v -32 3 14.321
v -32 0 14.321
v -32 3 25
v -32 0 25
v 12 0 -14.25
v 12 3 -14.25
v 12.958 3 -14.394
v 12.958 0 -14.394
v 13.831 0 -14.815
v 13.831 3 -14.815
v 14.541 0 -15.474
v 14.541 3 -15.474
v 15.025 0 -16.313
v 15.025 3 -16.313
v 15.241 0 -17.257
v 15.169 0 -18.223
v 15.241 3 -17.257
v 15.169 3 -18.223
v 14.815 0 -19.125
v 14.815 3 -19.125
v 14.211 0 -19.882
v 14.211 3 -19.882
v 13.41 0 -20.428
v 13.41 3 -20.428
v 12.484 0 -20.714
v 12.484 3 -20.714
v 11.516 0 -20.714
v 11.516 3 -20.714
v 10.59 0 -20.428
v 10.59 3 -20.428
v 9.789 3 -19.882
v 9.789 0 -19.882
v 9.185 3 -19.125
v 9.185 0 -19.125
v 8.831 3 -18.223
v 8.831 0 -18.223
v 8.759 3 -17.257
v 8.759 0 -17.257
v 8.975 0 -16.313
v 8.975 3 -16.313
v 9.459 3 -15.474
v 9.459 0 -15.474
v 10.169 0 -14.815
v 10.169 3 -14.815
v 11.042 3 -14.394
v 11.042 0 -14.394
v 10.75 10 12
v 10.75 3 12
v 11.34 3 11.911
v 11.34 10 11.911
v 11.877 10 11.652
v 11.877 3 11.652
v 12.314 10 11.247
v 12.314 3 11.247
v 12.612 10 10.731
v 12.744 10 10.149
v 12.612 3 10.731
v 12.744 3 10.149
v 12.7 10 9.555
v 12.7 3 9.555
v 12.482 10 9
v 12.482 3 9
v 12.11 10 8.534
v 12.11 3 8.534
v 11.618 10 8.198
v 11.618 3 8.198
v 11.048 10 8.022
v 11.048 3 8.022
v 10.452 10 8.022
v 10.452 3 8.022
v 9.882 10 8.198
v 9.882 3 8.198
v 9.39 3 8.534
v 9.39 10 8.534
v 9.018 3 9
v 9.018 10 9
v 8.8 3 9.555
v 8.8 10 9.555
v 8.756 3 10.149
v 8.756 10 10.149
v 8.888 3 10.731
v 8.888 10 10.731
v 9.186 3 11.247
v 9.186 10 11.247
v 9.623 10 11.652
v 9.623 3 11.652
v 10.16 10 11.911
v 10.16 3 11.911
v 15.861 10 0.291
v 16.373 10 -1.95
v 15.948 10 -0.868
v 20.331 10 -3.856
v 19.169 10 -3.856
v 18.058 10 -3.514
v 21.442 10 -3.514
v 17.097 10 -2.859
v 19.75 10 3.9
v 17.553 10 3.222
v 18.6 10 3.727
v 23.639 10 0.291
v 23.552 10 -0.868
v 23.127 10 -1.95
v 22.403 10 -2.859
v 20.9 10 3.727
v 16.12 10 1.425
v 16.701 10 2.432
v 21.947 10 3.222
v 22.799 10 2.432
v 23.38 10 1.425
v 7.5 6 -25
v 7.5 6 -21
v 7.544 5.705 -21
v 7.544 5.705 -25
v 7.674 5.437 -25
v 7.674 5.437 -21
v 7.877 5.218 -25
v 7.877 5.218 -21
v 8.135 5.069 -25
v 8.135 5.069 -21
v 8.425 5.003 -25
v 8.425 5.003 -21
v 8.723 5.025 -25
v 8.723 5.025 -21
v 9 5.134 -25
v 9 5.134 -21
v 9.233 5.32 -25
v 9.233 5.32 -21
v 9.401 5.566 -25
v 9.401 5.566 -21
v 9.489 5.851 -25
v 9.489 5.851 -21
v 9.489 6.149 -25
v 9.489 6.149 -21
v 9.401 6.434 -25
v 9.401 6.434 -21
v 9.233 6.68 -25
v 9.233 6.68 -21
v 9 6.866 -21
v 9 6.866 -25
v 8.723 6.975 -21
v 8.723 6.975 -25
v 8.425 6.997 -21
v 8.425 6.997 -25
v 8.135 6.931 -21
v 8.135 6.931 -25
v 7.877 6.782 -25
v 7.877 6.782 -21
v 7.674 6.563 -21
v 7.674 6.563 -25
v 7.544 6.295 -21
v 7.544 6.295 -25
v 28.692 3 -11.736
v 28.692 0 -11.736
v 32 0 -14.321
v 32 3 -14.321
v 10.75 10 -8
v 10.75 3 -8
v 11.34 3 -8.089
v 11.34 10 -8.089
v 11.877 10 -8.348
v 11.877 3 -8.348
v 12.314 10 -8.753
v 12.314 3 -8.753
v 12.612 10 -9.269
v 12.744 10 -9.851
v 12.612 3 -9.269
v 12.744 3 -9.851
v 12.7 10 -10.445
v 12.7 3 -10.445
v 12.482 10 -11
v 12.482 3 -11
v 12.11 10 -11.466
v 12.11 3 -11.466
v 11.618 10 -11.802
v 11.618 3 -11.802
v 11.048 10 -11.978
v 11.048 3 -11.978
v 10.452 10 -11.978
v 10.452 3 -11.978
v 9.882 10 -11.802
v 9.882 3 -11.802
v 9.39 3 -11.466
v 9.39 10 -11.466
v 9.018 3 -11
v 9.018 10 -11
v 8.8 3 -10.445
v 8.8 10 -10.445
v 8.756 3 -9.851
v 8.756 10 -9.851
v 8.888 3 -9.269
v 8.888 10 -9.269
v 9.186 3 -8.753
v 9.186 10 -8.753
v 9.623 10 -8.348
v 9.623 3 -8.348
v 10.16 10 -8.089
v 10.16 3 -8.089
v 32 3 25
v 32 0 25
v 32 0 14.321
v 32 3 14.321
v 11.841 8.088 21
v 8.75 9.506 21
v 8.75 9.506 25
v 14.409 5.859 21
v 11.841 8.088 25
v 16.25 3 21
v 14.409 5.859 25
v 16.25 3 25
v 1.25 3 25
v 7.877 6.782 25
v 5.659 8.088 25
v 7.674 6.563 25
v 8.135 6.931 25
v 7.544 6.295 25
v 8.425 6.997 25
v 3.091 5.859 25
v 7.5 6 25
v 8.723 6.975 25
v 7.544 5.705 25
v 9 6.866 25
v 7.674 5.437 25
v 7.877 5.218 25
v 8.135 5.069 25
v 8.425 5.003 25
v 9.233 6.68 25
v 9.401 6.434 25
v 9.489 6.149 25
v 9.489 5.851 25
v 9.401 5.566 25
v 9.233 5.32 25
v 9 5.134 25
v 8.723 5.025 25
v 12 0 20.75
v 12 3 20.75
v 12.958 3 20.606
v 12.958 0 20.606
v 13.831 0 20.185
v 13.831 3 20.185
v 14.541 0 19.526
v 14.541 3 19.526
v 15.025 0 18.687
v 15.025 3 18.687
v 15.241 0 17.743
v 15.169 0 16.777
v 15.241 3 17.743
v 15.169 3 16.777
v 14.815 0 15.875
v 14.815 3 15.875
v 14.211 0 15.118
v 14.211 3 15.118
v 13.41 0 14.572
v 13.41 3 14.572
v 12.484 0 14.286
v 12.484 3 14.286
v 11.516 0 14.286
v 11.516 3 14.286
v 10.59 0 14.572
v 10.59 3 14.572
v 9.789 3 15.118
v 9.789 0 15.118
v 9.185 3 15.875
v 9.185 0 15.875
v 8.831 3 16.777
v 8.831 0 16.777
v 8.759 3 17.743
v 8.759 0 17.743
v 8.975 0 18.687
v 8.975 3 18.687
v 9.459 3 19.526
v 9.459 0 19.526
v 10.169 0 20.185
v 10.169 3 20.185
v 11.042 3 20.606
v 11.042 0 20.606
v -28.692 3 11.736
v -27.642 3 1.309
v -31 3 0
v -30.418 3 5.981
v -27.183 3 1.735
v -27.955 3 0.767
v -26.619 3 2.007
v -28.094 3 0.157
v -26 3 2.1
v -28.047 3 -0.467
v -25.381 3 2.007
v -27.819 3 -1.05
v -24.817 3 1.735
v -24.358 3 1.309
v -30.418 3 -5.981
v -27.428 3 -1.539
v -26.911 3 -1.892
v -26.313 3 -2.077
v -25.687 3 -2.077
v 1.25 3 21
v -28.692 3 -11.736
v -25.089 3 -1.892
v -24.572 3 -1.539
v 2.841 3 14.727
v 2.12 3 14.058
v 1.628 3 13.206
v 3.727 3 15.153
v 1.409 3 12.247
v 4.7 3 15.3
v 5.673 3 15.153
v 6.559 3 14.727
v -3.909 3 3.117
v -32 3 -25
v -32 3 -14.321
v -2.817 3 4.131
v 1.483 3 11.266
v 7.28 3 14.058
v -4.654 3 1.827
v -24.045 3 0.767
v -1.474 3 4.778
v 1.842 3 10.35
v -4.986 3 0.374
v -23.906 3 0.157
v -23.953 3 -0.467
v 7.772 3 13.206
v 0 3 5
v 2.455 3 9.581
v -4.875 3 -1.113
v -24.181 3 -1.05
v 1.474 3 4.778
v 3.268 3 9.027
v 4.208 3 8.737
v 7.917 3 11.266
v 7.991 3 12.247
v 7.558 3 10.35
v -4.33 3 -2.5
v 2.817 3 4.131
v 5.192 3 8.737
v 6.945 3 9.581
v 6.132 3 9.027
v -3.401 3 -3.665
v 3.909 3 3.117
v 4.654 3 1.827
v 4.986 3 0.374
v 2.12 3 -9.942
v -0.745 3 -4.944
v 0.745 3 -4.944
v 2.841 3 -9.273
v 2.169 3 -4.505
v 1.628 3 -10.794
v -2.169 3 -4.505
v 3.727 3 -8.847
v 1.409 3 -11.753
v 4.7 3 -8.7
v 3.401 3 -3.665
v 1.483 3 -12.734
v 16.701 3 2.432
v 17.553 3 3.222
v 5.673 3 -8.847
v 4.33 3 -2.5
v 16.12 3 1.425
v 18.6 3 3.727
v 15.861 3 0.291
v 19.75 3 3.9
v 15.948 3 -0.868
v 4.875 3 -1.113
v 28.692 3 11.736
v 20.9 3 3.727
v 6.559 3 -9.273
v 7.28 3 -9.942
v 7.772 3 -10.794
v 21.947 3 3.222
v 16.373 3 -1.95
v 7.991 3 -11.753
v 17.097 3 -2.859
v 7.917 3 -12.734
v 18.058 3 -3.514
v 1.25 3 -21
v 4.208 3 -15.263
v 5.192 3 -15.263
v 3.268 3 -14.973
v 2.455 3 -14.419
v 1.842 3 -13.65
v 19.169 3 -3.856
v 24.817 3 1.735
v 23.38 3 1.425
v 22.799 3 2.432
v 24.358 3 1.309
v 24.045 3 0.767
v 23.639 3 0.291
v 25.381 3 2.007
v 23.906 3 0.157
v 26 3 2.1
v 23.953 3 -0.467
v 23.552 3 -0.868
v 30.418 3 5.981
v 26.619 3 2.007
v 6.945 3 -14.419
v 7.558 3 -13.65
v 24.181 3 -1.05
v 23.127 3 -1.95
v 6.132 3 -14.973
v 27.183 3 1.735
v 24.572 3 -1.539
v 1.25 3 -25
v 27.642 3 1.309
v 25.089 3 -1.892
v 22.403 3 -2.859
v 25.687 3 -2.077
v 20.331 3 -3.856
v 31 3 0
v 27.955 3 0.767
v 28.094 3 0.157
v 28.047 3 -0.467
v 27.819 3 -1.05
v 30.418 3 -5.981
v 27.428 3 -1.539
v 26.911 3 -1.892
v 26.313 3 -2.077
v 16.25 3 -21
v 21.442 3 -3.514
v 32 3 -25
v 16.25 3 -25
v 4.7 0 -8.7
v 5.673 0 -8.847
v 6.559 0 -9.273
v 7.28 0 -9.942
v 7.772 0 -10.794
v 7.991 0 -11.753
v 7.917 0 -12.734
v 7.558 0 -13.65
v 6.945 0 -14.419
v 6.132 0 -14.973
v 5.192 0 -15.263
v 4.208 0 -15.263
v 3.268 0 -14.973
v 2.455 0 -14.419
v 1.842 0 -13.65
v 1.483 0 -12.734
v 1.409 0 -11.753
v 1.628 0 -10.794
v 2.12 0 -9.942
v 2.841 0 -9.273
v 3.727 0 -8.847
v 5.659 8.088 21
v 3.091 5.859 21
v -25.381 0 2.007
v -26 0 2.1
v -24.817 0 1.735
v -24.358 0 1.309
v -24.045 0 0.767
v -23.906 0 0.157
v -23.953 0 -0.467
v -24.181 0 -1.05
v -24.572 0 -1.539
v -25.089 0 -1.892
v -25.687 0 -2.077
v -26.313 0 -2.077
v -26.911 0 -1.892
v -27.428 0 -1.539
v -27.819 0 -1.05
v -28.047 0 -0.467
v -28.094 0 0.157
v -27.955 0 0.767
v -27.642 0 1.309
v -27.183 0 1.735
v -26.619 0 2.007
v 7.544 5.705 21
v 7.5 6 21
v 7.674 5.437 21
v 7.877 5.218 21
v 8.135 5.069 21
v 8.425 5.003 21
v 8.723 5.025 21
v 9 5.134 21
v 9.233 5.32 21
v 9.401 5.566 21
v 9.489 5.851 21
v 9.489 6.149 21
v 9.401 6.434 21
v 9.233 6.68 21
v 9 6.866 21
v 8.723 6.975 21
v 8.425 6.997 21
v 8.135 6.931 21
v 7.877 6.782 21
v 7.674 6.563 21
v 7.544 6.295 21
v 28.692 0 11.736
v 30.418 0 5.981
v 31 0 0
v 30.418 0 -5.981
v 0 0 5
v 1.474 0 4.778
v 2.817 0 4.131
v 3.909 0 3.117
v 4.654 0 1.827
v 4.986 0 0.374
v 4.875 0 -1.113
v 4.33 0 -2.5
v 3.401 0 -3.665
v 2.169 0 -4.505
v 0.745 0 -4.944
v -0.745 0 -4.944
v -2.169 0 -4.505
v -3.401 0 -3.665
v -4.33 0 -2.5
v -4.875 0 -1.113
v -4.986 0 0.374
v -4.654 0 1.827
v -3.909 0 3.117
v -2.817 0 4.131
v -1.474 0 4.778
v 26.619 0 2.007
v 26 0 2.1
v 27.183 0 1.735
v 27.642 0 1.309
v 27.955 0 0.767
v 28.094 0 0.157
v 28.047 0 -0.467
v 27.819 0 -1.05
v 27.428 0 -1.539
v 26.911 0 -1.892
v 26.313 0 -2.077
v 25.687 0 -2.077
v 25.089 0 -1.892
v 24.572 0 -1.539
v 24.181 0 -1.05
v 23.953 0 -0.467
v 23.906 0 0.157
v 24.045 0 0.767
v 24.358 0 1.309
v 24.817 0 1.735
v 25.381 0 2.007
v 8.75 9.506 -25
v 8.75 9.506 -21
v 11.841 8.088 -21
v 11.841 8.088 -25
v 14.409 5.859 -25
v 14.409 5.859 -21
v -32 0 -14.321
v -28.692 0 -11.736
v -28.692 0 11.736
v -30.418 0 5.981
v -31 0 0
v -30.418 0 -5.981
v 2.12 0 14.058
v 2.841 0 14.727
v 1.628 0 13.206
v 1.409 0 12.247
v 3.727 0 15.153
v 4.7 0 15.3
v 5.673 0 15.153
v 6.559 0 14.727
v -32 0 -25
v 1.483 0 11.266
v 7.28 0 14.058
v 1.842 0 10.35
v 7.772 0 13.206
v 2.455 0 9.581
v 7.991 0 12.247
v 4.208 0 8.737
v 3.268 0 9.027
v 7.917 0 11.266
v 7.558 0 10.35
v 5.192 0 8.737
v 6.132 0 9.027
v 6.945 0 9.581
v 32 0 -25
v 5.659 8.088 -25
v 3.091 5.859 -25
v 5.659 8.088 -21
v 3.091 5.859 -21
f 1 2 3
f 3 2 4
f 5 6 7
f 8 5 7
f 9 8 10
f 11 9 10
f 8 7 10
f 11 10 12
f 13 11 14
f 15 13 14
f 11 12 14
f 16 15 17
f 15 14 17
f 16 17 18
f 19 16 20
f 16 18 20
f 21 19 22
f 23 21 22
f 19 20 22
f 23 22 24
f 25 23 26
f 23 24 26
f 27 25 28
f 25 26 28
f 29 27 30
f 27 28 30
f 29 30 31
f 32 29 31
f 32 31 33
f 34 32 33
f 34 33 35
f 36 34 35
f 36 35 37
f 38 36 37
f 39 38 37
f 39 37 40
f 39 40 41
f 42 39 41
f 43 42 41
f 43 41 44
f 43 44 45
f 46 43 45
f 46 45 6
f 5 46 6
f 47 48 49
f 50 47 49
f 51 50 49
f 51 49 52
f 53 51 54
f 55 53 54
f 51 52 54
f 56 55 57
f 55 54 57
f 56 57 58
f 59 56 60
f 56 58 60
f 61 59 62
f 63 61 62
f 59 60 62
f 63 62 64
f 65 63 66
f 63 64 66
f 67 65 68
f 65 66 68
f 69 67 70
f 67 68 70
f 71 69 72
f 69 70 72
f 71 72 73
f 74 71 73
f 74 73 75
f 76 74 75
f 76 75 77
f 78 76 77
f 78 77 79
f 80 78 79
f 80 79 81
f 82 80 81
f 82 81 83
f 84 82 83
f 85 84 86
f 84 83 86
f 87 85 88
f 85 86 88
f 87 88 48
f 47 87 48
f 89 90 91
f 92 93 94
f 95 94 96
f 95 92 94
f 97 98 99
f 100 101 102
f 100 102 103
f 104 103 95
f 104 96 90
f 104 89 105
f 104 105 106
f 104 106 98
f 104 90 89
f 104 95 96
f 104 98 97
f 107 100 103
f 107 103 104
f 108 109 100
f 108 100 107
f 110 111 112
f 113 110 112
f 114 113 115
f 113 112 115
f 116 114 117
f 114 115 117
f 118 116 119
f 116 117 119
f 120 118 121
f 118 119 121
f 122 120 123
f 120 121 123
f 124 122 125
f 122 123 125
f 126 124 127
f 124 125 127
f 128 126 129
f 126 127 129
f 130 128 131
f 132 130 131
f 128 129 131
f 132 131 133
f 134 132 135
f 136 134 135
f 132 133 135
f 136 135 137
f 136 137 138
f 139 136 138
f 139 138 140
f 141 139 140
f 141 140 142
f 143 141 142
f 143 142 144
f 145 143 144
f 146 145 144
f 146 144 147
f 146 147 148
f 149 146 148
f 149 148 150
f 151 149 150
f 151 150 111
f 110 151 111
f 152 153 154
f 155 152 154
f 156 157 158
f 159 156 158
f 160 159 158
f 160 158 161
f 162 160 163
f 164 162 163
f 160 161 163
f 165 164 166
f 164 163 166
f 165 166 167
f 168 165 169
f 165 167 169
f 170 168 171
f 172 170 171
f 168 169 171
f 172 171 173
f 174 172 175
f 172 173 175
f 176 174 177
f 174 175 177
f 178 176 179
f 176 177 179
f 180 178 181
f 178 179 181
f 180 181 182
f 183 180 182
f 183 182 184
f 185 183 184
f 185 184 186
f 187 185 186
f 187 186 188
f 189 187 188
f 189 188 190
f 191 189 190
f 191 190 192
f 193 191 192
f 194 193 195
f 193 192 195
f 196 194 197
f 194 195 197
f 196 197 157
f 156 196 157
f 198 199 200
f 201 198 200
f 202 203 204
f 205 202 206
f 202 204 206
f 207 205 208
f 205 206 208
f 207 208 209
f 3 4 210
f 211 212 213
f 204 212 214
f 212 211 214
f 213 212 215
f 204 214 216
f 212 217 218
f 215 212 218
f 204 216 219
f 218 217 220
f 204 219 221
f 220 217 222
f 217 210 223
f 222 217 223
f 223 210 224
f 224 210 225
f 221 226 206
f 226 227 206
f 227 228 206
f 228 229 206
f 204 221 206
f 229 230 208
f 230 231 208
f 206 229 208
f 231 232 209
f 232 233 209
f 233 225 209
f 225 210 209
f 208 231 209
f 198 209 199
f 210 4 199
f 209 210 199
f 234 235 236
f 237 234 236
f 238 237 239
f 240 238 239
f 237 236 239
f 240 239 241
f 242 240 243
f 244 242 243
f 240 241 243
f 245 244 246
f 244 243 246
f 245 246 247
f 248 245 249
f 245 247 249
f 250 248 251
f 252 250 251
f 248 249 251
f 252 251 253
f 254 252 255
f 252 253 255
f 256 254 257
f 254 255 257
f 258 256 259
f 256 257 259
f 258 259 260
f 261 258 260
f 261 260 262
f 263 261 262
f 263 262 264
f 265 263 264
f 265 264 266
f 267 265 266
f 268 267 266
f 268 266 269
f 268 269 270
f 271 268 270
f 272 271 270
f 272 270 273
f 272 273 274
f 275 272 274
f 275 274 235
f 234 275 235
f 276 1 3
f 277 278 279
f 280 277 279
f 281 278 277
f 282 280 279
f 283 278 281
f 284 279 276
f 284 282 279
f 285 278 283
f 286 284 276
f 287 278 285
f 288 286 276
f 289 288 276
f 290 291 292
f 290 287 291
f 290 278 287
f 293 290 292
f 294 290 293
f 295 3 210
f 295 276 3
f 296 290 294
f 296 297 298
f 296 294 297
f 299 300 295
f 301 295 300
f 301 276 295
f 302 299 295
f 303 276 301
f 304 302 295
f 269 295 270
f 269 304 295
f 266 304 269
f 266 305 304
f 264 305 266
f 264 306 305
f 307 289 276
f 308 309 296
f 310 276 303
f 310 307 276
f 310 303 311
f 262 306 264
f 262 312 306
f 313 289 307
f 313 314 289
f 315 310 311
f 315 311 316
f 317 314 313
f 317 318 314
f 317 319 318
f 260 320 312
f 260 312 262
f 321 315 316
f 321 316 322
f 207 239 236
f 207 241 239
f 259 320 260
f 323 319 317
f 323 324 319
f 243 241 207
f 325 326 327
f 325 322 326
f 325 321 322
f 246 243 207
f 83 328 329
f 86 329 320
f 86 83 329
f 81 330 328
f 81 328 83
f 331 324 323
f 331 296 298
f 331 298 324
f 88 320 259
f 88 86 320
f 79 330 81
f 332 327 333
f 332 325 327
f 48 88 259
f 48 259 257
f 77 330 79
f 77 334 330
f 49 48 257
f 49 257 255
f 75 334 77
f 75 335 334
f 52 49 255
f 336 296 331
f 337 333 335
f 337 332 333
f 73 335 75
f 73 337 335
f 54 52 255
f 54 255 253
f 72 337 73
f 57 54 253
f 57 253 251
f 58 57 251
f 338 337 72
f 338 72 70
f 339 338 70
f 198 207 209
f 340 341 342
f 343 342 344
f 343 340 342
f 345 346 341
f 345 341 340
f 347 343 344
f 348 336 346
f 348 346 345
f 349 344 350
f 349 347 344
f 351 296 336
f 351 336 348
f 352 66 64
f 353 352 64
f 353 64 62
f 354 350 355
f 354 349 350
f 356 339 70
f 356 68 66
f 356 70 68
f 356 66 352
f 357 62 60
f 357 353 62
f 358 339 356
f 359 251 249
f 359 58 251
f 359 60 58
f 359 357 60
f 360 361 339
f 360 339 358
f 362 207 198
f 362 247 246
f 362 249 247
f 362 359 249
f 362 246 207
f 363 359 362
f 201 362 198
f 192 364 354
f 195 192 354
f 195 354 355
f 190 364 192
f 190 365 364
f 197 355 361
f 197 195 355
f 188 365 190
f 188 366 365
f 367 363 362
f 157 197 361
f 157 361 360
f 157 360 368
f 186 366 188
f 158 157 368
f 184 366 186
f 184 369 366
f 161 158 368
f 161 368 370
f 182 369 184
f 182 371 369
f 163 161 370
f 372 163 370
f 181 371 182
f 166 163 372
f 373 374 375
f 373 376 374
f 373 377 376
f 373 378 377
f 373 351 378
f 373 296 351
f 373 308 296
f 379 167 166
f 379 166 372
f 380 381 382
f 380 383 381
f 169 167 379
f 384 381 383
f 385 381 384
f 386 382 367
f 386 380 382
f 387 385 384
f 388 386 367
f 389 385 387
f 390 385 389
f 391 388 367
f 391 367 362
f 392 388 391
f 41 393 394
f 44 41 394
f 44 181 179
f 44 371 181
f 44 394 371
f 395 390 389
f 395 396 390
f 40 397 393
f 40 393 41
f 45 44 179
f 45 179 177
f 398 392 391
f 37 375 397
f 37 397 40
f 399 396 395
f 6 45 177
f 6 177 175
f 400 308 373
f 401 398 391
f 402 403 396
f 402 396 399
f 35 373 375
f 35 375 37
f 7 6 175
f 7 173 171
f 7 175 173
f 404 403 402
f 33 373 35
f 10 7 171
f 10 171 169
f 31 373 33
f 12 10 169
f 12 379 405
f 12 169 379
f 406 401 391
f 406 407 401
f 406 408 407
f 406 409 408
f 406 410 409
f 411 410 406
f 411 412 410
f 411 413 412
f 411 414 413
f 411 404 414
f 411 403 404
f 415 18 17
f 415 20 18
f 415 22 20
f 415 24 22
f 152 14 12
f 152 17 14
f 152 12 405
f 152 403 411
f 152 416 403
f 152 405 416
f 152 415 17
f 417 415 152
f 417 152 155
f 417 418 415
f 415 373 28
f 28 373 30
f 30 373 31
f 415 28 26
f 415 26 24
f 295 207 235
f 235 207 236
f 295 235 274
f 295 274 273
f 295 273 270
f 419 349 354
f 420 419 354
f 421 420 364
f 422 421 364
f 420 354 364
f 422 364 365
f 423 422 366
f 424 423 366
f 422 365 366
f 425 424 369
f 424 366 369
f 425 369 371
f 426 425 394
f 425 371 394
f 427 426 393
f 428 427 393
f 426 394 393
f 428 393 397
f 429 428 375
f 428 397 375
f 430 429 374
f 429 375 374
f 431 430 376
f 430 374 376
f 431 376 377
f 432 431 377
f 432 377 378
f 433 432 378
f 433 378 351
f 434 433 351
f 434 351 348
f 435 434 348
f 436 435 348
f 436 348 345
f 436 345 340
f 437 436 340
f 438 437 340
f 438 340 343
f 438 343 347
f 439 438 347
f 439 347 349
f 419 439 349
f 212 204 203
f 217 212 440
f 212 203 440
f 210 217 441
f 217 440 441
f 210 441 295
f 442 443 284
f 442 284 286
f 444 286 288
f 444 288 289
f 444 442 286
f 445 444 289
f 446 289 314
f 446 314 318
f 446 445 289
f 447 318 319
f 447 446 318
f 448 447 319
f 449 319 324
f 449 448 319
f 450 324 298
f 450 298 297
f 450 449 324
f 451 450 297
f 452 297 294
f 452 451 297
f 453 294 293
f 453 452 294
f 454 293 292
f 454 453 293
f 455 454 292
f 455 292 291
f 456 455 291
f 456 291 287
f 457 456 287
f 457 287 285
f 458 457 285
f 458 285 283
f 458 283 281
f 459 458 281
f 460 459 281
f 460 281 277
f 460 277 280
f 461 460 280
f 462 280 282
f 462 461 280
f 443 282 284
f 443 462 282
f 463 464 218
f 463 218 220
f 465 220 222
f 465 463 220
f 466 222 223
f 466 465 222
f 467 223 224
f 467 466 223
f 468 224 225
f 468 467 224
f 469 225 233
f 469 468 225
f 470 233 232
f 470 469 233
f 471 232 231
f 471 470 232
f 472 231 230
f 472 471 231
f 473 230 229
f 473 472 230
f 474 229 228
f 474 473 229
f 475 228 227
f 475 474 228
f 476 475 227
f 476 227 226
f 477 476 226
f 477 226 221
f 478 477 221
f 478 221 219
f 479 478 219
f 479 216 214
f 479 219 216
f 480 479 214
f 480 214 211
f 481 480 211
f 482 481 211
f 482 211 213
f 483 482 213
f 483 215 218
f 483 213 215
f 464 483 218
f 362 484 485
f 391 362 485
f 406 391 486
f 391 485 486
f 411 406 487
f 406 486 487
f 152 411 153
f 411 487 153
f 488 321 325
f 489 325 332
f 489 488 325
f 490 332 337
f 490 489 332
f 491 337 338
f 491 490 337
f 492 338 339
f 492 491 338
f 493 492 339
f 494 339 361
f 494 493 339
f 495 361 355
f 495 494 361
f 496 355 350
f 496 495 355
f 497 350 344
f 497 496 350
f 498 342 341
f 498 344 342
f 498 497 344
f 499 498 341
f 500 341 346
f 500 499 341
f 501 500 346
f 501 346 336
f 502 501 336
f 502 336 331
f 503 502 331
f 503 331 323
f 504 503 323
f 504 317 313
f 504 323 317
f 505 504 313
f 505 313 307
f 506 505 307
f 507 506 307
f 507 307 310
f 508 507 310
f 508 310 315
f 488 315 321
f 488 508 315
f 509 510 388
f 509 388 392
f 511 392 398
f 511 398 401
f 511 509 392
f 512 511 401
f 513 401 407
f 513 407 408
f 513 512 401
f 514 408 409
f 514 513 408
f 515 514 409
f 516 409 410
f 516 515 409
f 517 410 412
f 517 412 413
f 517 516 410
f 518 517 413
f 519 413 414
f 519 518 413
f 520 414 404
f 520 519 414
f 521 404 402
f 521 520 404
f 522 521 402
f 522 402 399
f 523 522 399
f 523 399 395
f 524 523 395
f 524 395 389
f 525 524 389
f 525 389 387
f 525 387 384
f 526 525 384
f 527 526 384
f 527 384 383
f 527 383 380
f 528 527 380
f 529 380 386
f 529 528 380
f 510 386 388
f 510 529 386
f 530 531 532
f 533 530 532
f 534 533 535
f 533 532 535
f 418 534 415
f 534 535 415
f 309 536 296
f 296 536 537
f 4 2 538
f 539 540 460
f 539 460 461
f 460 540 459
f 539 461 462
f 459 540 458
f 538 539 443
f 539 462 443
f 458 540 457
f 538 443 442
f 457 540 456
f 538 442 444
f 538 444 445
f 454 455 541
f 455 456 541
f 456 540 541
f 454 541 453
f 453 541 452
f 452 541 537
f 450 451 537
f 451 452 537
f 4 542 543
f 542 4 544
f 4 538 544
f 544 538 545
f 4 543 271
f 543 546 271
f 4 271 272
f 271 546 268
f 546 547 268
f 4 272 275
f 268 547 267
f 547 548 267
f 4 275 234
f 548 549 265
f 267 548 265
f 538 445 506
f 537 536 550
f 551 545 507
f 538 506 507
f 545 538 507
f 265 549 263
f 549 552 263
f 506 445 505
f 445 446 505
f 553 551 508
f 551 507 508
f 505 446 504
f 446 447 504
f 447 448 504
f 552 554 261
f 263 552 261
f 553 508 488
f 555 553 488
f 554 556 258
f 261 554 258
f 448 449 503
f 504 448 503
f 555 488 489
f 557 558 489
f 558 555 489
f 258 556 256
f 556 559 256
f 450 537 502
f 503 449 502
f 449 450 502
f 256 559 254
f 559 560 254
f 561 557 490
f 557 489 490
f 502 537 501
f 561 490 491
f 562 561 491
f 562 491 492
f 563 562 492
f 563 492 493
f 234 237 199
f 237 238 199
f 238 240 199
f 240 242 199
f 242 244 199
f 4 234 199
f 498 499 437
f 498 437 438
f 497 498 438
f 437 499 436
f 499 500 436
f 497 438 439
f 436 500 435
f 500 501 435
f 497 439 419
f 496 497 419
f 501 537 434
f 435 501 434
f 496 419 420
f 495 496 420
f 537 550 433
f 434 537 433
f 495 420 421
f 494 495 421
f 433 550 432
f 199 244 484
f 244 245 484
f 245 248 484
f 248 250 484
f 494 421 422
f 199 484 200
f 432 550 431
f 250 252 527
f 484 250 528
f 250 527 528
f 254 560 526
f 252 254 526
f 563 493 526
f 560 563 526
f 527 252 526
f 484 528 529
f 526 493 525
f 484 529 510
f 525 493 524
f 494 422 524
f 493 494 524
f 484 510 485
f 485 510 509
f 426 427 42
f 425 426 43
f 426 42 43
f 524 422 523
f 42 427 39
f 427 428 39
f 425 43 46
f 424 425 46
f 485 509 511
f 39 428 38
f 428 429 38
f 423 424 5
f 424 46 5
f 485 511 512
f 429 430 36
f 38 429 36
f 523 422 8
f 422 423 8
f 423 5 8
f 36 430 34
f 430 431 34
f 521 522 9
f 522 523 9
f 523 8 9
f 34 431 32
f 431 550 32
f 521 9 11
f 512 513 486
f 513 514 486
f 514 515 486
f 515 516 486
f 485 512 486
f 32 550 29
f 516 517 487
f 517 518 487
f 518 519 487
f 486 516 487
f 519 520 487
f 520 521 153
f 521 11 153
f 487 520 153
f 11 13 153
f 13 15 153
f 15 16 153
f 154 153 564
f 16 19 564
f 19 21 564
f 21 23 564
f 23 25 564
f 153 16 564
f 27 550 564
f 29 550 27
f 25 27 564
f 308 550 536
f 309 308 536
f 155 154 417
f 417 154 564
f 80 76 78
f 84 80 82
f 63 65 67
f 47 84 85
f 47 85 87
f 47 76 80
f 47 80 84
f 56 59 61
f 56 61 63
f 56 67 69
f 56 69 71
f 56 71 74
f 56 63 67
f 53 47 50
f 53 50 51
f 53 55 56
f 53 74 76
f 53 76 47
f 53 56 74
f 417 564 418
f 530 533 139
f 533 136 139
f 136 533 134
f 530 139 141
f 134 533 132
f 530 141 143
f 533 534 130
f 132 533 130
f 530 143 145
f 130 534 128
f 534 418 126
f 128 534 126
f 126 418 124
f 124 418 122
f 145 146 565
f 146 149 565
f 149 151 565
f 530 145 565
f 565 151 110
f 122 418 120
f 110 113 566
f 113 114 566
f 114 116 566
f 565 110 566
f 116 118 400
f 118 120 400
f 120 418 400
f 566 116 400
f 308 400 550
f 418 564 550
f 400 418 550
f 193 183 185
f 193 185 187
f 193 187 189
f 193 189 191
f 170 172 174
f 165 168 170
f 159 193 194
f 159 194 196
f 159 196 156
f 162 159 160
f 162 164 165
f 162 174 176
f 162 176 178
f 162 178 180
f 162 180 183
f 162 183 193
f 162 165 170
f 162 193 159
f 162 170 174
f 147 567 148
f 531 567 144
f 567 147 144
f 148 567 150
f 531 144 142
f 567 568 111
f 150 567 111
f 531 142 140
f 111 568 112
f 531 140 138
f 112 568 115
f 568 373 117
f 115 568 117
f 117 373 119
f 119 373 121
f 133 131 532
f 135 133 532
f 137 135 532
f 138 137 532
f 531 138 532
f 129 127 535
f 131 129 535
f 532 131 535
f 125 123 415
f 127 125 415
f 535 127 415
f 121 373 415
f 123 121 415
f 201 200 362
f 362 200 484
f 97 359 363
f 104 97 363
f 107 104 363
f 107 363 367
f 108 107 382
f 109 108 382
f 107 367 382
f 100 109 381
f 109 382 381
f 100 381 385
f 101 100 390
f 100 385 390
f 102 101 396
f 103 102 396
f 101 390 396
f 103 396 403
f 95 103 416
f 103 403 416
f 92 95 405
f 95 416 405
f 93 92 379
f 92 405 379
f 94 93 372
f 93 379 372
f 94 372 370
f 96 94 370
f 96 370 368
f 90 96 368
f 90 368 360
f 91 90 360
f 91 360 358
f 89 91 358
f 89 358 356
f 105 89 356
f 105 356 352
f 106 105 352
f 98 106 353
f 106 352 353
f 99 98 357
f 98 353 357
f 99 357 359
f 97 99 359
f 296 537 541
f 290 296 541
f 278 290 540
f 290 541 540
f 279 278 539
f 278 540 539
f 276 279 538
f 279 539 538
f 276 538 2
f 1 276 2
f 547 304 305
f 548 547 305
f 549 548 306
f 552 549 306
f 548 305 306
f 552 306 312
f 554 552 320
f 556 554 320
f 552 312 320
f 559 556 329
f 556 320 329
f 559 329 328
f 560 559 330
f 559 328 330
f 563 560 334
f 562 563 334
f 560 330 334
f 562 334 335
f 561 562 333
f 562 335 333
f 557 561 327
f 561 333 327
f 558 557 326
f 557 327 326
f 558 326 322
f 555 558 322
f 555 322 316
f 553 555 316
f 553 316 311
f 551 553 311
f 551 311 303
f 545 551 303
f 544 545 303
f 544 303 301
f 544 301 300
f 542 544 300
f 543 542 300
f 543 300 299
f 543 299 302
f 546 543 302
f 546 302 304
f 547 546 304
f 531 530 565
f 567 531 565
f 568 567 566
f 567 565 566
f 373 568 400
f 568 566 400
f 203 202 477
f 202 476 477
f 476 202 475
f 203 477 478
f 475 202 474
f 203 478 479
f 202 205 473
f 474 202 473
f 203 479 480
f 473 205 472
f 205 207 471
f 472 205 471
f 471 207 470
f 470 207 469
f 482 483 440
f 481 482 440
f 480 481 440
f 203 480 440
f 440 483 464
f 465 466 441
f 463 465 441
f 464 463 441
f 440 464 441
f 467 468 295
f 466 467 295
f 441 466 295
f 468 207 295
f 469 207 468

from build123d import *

# Parameters (mm, degrees)
SKETCH1_R               = 2.1
BOSS_EXTRUDE2_DEPTH     = 3
SKETCH1_14_R            = 5
CUT_EXTRUDE2_DEPTH      = 10
SKETCH2_R               = 2
SKETCH2_W               = 15
SKETCH2_H               = 4
SKETCH2_R_2             = 3.9
BOSS_EXTRUDE3_DEPTH     = 7
SKETCH2_4_R             = 3.25
SKETCH2_4_R_2           = 3.3
CUT_EXTRUDE3_DEPTH      = 7
CUT_EXTRUDE4_DEPTH      = 61.199667773
CUT_EXTRUDE4_DEPTH_BACK = 7
SKETCH3_R               = 1
FILLET1_R               = 12
CUT_EXTRUDE5_START      = -41
SKETCH3_3_R             = 1
CUT_EXTRUDE5_DEPTH      = 9


with BuildPart() as part:
    # Sketch1 → Boss-Extrude2 (new body)
    with BuildSketch(Plane(origin=(0, 0, 0), x_dir=(1, 0, 0), z_dir=(0, 1, 0))):
        with BuildLine():
            Line((32, -25), (32, -14.320549047))
            Line((32, -14.320549047), (28.692414075, -11.736497543))
            ThreePointArc((28.692414075, -11.736497543), (31, 0), (28.692414075, 11.736497543))
            Line((28.692414075, 11.736497543), (32, 14.320549047))
            Line((32, 14.320549047), (32, 25))
            Line((32, 25), (-32, 25))
            Line((-32, 25), (-32, 14.320549047))
            Line((-32, 14.320549047), (-28.692414075, 11.736497543))
            ThreePointArc((-28.692414075, 11.736497543), (-31, 0), (-28.692414075, -11.736497543))
            Line((-28.692414075, -11.736497543), (-32, -14.320549047))
            Line((-32, -14.320549047), (-32, -25))
            Line((-32, -25), (32, -25))
        make_face()
        with Locations(Location((26, 0, 0), (0, 0, 270))):
            Circle(SKETCH1_R, mode=Mode.SUBTRACT)
        with Locations(Location((-26, 0, 0), (0, 0, 270))):
            Circle(SKETCH1_R, mode=Mode.SUBTRACT)
    extrude(amount=BOSS_EXTRUDE2_DEPTH)

    # Sketch1<14> → Cut-Extrude2 (cut)
    with BuildSketch(Plane(origin=(0, 0, 0), x_dir=(1, 0, 0), z_dir=(0, 1, 0))):
        with Locations(Location((0, 0, 0), (0, 0, 270))):
            Circle(SKETCH1_14_R)
    extrude(amount=CUT_EXTRUDE2_DEPTH, mode=Mode.SUBTRACT)

    # Sketch2 → Boss-Extrude3 (add)
    with BuildSketch(Plane(origin=(0, 3, 0), x_dir=(1, 0, 0), z_dir=(0, 1, 0))):
        with Locations(Location((10.75, -10, 0), (0, 0, 269.999999999))):
            Circle(SKETCH2_R)
        Polygon((8.75, -21), (1.25, -21), (1.25, -25), (16.25, -25), (16.25, -21), align=None)
        with Locations((8.75, 23)):
            Rectangle(SKETCH2_W, SKETCH2_H)
        with Locations(Location((19.75, 0, 0), (0, 0, 270))):
            Circle(SKETCH2_R_2)
        with Locations(Location((10.75, 10, 0), (0, 0, 270))):
            Circle(SKETCH2_R)
    extrude(amount=BOSS_EXTRUDE3_DEPTH)

    # Sketch2<4> → Cut-Extrude3 (cut)
    with BuildSketch(Plane(origin=(0, 3, 0), x_dir=(1, 0, 0), z_dir=(0, 1, 0))):
        with Locations(Location((12, 17.5, 0), (0, 0, 270))):
            Circle(SKETCH2_4_R)
        with Locations(Location((4.7, 12, 0), (0, 0, 270))):
            Circle(SKETCH2_4_R_2)
        with Locations(Location((12, -17.5, 0), (0, 0, 270))):
            Circle(SKETCH2_4_R)
        with Locations(Location((4.7, -12, 0), (0, 0, 270))):
            Circle(SKETCH2_4_R_2)
    extrude(amount=-CUT_EXTRUDE3_DEPTH, mode=Mode.SUBTRACT)

    # Sketch3 → Cut-Extrude4 (cut, two sides: drawn at the far end of the back side and taken through both)
    with BuildSketch(Plane.XY.offset(25).offset(-CUT_EXTRUDE4_DEPTH_BACK)):
        with Locations(Location((8.5, 6, 0), (0, 0, 180))):
            Circle(SKETCH3_R)
    extrude(amount=CUT_EXTRUDE4_DEPTH + CUT_EXTRUDE4_DEPTH_BACK, mode=Mode.SUBTRACT)

    # Fillet1
    # the kernel refuses this fillet: 12 mm, written as the material it takes off along each edge
    with BuildSketch(Plane(origin=(1.25, 10, -52.271780287), x_dir=(0, -1, 0), z_dir=(0, 0, 1)), Plane(origin=(16.25, 10, -21), x_dir=(0, -1, 0), z_dir=(0, 0, -1)), Plane(origin=(1.25, 10, 21), x_dir=(0, -1, 0), z_dir=(0, 0, 1)), Plane(origin=(16.25, 10, 52.271780287), x_dir=(0, -1, 0), z_dir=(0, 0, -1))) as fillet1_piece_1:
        with BuildLine():
            CenterArc((12, 10.908712115), FILLET1_R, 180, 65.375681648)
            Line((0, 10.908712115), (0, 0))
            Line((0, 0), (7, 0))
        make_face()
    extrude(amount=31.271780287, mode=Mode.SUBTRACT)

    # Sketch3<3> → Cut-Extrude5 (cut)
    with BuildSketch(Plane.XY.offset(25).offset(CUT_EXTRUDE5_START)):
        with Locations(Location((8.5, 6, 0), (0, 0, 180))):
            Circle(SKETCH3_3_R)
    extrude(amount=-CUT_EXTRUDE5_DEPTH, mode=Mode.SUBTRACT)


solid = part.part
